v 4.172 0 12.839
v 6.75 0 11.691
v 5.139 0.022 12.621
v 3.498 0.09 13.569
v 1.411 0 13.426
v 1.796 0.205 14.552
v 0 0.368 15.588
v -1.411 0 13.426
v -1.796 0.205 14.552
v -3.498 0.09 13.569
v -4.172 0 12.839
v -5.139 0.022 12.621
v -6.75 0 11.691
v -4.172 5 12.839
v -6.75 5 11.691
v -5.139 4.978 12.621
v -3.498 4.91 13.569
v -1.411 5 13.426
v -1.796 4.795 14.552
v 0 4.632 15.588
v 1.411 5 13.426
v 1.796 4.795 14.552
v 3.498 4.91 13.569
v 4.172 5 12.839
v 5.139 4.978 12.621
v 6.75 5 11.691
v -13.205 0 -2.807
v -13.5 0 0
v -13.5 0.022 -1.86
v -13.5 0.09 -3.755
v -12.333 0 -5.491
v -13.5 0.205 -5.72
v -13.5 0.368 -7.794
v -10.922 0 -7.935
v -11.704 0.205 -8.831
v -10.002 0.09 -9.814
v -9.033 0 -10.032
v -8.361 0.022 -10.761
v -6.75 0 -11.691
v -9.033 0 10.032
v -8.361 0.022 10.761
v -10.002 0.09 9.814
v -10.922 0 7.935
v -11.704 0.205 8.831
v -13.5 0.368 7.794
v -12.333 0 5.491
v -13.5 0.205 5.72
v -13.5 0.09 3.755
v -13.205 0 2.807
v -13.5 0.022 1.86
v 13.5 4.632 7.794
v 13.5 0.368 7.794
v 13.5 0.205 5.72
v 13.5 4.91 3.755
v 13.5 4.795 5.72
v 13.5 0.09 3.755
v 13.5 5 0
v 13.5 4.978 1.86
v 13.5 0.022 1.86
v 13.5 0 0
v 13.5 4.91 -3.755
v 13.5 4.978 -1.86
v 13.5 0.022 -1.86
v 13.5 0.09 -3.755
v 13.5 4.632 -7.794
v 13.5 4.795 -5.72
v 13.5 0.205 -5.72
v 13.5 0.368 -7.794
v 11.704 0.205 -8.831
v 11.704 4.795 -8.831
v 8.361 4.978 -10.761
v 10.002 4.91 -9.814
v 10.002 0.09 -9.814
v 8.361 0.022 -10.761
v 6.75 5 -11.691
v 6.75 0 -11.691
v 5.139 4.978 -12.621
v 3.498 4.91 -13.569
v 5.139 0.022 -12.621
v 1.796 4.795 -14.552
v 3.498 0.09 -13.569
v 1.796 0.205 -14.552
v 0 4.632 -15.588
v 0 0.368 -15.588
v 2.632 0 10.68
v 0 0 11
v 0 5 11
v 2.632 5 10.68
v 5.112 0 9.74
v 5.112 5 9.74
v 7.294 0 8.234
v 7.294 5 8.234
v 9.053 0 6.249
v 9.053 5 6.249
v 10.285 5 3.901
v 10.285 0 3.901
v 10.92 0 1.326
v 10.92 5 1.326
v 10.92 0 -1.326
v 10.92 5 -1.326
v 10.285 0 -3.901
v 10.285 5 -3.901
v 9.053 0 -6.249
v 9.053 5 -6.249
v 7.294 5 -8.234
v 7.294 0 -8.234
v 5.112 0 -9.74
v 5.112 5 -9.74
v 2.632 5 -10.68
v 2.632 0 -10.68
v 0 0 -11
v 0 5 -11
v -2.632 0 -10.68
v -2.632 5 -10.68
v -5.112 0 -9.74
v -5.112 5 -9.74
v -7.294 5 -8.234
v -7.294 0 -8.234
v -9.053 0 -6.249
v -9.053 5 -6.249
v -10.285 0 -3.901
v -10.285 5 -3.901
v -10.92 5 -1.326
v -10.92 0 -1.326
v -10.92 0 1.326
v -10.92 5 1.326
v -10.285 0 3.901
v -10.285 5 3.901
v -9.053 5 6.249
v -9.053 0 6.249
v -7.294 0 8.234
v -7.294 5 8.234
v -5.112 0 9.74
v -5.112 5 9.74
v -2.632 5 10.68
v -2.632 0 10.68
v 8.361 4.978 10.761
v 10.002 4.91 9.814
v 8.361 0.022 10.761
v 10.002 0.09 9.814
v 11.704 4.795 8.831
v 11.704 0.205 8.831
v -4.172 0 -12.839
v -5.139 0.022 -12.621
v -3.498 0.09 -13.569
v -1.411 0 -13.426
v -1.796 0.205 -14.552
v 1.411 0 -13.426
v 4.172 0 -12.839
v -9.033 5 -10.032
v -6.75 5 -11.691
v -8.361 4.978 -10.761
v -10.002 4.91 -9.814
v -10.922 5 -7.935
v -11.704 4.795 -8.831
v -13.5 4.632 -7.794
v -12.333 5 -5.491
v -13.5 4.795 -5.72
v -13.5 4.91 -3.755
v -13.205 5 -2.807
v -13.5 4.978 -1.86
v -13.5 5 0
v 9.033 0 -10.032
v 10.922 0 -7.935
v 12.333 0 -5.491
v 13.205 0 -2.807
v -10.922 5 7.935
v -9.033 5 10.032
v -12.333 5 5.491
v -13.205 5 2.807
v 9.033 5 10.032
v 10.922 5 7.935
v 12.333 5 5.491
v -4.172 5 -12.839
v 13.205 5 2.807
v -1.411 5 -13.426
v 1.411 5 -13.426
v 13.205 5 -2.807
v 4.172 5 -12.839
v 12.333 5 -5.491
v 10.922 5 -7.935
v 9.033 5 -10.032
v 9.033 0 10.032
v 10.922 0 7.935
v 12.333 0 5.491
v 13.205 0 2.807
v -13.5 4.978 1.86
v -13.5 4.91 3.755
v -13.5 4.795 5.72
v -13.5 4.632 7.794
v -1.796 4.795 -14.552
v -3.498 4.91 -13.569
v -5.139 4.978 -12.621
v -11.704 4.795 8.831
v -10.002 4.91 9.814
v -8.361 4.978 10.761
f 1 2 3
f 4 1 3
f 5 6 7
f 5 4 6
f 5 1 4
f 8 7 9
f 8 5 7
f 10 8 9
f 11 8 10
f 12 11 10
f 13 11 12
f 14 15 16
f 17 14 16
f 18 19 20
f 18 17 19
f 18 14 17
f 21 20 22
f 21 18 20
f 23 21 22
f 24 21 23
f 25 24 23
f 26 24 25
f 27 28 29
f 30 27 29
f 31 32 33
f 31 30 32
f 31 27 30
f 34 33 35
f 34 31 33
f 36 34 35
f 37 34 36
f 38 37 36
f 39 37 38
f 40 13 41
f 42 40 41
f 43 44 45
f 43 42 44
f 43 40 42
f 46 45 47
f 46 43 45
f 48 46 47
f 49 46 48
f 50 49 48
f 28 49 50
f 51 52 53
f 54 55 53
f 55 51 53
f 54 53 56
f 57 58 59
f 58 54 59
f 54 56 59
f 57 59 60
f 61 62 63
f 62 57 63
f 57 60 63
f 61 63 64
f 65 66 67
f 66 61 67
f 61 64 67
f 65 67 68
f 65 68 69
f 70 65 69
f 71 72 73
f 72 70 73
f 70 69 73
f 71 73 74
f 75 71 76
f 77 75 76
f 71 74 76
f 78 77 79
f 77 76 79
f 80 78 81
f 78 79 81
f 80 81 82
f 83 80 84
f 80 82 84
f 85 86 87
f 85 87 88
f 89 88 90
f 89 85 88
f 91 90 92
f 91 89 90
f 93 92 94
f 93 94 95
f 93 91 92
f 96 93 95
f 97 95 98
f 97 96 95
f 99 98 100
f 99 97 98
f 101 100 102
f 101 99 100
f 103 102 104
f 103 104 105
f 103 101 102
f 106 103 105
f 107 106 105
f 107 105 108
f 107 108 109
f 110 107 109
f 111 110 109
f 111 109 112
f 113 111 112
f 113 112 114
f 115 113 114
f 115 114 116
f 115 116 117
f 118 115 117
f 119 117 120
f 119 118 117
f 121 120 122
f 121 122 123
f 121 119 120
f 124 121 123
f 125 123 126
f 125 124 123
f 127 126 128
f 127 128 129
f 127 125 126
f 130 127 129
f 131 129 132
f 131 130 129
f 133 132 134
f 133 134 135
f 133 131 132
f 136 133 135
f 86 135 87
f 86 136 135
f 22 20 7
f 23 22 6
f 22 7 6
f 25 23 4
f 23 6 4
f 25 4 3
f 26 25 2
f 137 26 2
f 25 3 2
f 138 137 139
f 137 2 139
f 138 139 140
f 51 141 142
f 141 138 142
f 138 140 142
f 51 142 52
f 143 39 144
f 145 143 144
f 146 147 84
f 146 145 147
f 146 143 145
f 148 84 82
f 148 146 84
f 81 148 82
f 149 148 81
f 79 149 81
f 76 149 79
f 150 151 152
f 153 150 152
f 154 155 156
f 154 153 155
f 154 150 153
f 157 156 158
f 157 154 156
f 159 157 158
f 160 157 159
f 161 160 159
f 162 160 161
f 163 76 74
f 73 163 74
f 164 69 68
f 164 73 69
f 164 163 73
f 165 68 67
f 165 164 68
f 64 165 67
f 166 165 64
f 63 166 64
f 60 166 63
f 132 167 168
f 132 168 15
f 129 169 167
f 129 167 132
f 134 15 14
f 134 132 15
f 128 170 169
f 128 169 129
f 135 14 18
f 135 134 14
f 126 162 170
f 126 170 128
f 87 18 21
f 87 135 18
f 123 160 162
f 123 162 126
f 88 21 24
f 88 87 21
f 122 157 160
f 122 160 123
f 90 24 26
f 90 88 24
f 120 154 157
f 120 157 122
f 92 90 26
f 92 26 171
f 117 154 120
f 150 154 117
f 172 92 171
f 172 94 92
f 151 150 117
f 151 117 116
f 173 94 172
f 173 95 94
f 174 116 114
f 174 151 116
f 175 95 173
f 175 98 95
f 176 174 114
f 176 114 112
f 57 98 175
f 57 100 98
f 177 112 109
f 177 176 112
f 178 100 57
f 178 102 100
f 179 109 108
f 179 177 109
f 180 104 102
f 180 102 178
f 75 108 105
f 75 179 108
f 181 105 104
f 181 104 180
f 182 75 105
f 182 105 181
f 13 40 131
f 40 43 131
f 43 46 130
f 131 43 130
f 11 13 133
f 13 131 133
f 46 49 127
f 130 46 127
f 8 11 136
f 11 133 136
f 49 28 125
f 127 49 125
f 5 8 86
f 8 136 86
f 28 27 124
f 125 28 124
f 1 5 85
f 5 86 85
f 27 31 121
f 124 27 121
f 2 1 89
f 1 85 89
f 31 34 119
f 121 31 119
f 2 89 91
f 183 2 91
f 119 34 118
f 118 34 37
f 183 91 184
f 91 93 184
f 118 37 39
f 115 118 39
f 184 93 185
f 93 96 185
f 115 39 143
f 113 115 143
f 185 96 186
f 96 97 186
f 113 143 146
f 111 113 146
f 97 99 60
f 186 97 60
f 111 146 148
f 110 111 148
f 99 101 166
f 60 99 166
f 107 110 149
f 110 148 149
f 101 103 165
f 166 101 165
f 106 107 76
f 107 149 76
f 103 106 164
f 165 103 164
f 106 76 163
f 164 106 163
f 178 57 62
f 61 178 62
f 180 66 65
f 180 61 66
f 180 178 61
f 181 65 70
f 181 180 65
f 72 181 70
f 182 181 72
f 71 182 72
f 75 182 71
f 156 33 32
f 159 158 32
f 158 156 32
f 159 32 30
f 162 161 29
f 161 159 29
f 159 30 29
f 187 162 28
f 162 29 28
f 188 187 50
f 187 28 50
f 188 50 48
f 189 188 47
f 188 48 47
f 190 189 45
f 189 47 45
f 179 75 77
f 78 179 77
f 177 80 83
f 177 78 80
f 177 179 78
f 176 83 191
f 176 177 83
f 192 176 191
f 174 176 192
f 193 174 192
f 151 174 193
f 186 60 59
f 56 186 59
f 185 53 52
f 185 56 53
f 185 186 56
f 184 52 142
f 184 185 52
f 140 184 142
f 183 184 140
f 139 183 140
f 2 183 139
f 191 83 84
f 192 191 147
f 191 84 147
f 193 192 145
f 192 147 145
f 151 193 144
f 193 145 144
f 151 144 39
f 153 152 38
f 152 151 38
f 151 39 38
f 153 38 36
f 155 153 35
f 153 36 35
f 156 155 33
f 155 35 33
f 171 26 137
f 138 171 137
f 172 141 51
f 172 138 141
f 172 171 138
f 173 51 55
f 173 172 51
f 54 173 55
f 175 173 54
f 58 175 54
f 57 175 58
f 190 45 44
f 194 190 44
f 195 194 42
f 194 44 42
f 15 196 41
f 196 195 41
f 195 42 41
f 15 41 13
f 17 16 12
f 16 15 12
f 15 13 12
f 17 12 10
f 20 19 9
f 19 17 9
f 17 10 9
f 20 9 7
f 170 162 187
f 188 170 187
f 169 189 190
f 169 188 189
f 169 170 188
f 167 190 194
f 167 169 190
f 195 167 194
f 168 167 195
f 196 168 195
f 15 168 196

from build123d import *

# Parameters (mm, degrees)
CROQUIS1_R              = 11
SALIENTE_EXTRUIR1_DEPTH = 5
CROQUIS2_OUTSIDE_W      = 289.33
CROQUIS2_OUTSIDE_H      = 293.506
CROQUIS2_OUTSIDE_R      = 13.5
CORTAR_EXTRUIR1_DEPTH   = 22.219095174
CORTAR_EXTRUIR1_DRAFT   = -80
CROQUIS3_OUTSIDE_W      = 94.022
CROQUIS3_OUTSIDE_H      = 98.198
CROQUIS3_OUTSIDE_R      = 13.5
CORTAR_EXTRUIR2_DEPTH   = 5
CORTAR_EXTRUIR2_DRAFT   = -80


with BuildPart() as part:
    # Croquis1 → Saliente-Extruir1 (new body)
    with BuildSketch(Plane(origin=(0, 0, 0), x_dir=(1, 0, 0), z_dir=(0, 1, 0))):
        Polygon((0, 15.588457268), (-13.5, 7.794228634), (-13.5, -7.794228634), (0, -15.588457268), (13.5, -7.794228634), (13.5, 7.794228634), align=None)
        with Locations(Location((0, 0, 0), (0, 0, 270))):
            Circle(CROQUIS1_R, mode=Mode.SUBTRACT)
    extrude(amount=SALIENTE_EXTRUIR1_DEPTH)


with BuildPart() as cortar_extruir1_tool:
    # Croquis2 outside → Cortar-Extruir1 (with draft: the straight prism first)
    with BuildSketch(Plane(origin=(0, 5, 0), x_dir=(1, 0, 0), z_dir=(0, 1, 0))):
        Rectangle(CROQUIS2_OUTSIDE_W, CROQUIS2_OUTSIDE_H)
        Circle(CROQUIS2_OUTSIDE_R, mode=Mode.SUBTRACT)
    extrude(amount=-CORTAR_EXTRUIR1_DEPTH)
    # Cortar-Extruir1: the draft: its side faces are tilted about the plane it starts from
    cortar_extruir1_sides = [cortar_extruir1_tool.faces().sort_by_distance(p)[0] for p in [
        (0, -6.109547587, 146.753),
        (144.665, -6.109547587, 0),
        (0, -6.109547587, -146.753),
        (-144.665, -6.109547587, 0),
        (-13.5, -6.109547587, 0),
    ]]
    draft(cortar_extruir1_sides, Plane(origin=(0, 5, 0), x_dir=(1, 0, 0), z_dir=(0, 1, 0)), CORTAR_EXTRUIR1_DRAFT)


with BuildPart() as part_1:
    add(part.part)

    # Cortar-Extruir1: cut by cortar_extruir1_tool
    add(cortar_extruir1_tool.part, mode=Mode.SUBTRACT)


with BuildPart() as cortar_extruir2_tool:
    # Croquis3 outside → Cortar-Extruir2 (with draft: the straight prism first)
    with BuildSketch(Plane.XZ):
        Rectangle(CROQUIS3_OUTSIDE_W, CROQUIS3_OUTSIDE_H)
        Circle(CROQUIS3_OUTSIDE_R, mode=Mode.SUBTRACT)
    extrude(amount=-CORTAR_EXTRUIR2_DEPTH)
    # Cortar-Extruir2: the draft: its side faces are tilted about the plane it starts from
    cortar_extruir2_sides = [cortar_extruir2_tool.faces().sort_by_distance(p)[0] for p in [
        (0, 2.5, -49.099),
        (47.011, 2.5, 0),
        (0, 2.5, 49.099),
        (-47.011, 2.5, 0),
        (-13.5, 2.5, 0),
    ]]
    draft(cortar_extruir2_sides, Plane.XZ, CORTAR_EXTRUIR2_DRAFT)


with BuildPart() as part_2:
    add(part_1.part)

    # Cortar-Extruir2: cut by cortar_extruir2_tool
    add(cortar_extruir2_tool.part, mode=Mode.SUBTRACT)


solid = part_2.part
